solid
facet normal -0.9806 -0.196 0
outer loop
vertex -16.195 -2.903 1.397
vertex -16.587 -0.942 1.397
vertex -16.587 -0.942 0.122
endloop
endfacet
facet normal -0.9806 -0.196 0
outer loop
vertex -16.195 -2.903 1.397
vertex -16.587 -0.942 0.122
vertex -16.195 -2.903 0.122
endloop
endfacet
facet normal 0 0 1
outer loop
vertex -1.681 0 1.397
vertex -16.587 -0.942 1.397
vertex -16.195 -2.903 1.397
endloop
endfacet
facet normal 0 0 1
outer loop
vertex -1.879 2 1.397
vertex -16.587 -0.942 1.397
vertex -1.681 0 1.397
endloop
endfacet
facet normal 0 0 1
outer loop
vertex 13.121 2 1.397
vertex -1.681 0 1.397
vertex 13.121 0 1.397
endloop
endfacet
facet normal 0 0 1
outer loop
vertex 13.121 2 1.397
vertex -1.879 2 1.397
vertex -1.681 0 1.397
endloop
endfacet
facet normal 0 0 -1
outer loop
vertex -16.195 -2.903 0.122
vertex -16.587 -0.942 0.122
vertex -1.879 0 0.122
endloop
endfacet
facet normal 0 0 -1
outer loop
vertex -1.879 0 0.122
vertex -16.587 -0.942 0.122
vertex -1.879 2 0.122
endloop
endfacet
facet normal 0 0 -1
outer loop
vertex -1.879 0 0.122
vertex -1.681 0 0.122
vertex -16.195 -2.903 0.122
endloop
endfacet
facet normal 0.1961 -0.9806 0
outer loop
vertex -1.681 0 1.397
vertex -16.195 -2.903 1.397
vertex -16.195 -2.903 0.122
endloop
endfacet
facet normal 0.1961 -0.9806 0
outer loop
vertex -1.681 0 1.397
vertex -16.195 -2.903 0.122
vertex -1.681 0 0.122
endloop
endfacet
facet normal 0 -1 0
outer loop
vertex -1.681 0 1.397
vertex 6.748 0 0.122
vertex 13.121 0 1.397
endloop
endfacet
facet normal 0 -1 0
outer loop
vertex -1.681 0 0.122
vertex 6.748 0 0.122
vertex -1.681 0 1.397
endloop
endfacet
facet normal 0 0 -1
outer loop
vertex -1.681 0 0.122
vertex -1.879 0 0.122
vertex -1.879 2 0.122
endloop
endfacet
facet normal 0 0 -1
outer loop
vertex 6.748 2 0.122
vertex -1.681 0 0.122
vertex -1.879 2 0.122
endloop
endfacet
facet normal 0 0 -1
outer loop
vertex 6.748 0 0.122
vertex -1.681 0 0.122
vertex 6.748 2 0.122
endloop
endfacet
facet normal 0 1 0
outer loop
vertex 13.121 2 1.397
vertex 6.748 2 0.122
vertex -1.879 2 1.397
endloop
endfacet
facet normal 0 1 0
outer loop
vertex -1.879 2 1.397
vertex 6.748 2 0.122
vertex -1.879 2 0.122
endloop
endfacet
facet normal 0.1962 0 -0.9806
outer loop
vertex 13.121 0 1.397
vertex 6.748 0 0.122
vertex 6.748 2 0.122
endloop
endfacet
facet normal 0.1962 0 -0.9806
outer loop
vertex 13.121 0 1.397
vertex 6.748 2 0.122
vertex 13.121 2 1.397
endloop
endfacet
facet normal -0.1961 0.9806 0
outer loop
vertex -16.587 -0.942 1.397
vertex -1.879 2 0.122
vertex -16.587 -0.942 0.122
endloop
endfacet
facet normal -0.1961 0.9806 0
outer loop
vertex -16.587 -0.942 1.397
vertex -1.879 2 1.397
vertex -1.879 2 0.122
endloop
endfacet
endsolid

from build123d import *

# Parameters (mm, degrees)
BOSS_EXTRUDE2_DEPTH = 2
BOSS_EXTRUDE4_DEPTH = 1.274755


with BuildPart() as part:
    # Sketch1 → Boss-Extrude2 (new body)
    with BuildSketch(Plane(origin=(0, 0, 0), x_dir=(1, 0, 0), z_dir=(0, 1, 0))):
        Polygon((-1.878719766, -1.397030535), (-1.878719766, -0.122275657), (6.747505842, -0.122275657), (13.121280234, -1.397030535), align=None)
    extrude(amount=BOSS_EXTRUDE2_DEPTH)

    # Sketch4 → Boss-Extrude4 (add)
    with BuildSketch(Plane.XY.offset(1.397030535)):
        Polygon((-1.878719766, 2), (-16.587429902, -0.941742026), (-16.195197632, -2.902903377), (-1.486487496, 0.038838649), align=None)
    extrude(amount=-BOSS_EXTRUDE4_DEPTH)


solid = part.part
